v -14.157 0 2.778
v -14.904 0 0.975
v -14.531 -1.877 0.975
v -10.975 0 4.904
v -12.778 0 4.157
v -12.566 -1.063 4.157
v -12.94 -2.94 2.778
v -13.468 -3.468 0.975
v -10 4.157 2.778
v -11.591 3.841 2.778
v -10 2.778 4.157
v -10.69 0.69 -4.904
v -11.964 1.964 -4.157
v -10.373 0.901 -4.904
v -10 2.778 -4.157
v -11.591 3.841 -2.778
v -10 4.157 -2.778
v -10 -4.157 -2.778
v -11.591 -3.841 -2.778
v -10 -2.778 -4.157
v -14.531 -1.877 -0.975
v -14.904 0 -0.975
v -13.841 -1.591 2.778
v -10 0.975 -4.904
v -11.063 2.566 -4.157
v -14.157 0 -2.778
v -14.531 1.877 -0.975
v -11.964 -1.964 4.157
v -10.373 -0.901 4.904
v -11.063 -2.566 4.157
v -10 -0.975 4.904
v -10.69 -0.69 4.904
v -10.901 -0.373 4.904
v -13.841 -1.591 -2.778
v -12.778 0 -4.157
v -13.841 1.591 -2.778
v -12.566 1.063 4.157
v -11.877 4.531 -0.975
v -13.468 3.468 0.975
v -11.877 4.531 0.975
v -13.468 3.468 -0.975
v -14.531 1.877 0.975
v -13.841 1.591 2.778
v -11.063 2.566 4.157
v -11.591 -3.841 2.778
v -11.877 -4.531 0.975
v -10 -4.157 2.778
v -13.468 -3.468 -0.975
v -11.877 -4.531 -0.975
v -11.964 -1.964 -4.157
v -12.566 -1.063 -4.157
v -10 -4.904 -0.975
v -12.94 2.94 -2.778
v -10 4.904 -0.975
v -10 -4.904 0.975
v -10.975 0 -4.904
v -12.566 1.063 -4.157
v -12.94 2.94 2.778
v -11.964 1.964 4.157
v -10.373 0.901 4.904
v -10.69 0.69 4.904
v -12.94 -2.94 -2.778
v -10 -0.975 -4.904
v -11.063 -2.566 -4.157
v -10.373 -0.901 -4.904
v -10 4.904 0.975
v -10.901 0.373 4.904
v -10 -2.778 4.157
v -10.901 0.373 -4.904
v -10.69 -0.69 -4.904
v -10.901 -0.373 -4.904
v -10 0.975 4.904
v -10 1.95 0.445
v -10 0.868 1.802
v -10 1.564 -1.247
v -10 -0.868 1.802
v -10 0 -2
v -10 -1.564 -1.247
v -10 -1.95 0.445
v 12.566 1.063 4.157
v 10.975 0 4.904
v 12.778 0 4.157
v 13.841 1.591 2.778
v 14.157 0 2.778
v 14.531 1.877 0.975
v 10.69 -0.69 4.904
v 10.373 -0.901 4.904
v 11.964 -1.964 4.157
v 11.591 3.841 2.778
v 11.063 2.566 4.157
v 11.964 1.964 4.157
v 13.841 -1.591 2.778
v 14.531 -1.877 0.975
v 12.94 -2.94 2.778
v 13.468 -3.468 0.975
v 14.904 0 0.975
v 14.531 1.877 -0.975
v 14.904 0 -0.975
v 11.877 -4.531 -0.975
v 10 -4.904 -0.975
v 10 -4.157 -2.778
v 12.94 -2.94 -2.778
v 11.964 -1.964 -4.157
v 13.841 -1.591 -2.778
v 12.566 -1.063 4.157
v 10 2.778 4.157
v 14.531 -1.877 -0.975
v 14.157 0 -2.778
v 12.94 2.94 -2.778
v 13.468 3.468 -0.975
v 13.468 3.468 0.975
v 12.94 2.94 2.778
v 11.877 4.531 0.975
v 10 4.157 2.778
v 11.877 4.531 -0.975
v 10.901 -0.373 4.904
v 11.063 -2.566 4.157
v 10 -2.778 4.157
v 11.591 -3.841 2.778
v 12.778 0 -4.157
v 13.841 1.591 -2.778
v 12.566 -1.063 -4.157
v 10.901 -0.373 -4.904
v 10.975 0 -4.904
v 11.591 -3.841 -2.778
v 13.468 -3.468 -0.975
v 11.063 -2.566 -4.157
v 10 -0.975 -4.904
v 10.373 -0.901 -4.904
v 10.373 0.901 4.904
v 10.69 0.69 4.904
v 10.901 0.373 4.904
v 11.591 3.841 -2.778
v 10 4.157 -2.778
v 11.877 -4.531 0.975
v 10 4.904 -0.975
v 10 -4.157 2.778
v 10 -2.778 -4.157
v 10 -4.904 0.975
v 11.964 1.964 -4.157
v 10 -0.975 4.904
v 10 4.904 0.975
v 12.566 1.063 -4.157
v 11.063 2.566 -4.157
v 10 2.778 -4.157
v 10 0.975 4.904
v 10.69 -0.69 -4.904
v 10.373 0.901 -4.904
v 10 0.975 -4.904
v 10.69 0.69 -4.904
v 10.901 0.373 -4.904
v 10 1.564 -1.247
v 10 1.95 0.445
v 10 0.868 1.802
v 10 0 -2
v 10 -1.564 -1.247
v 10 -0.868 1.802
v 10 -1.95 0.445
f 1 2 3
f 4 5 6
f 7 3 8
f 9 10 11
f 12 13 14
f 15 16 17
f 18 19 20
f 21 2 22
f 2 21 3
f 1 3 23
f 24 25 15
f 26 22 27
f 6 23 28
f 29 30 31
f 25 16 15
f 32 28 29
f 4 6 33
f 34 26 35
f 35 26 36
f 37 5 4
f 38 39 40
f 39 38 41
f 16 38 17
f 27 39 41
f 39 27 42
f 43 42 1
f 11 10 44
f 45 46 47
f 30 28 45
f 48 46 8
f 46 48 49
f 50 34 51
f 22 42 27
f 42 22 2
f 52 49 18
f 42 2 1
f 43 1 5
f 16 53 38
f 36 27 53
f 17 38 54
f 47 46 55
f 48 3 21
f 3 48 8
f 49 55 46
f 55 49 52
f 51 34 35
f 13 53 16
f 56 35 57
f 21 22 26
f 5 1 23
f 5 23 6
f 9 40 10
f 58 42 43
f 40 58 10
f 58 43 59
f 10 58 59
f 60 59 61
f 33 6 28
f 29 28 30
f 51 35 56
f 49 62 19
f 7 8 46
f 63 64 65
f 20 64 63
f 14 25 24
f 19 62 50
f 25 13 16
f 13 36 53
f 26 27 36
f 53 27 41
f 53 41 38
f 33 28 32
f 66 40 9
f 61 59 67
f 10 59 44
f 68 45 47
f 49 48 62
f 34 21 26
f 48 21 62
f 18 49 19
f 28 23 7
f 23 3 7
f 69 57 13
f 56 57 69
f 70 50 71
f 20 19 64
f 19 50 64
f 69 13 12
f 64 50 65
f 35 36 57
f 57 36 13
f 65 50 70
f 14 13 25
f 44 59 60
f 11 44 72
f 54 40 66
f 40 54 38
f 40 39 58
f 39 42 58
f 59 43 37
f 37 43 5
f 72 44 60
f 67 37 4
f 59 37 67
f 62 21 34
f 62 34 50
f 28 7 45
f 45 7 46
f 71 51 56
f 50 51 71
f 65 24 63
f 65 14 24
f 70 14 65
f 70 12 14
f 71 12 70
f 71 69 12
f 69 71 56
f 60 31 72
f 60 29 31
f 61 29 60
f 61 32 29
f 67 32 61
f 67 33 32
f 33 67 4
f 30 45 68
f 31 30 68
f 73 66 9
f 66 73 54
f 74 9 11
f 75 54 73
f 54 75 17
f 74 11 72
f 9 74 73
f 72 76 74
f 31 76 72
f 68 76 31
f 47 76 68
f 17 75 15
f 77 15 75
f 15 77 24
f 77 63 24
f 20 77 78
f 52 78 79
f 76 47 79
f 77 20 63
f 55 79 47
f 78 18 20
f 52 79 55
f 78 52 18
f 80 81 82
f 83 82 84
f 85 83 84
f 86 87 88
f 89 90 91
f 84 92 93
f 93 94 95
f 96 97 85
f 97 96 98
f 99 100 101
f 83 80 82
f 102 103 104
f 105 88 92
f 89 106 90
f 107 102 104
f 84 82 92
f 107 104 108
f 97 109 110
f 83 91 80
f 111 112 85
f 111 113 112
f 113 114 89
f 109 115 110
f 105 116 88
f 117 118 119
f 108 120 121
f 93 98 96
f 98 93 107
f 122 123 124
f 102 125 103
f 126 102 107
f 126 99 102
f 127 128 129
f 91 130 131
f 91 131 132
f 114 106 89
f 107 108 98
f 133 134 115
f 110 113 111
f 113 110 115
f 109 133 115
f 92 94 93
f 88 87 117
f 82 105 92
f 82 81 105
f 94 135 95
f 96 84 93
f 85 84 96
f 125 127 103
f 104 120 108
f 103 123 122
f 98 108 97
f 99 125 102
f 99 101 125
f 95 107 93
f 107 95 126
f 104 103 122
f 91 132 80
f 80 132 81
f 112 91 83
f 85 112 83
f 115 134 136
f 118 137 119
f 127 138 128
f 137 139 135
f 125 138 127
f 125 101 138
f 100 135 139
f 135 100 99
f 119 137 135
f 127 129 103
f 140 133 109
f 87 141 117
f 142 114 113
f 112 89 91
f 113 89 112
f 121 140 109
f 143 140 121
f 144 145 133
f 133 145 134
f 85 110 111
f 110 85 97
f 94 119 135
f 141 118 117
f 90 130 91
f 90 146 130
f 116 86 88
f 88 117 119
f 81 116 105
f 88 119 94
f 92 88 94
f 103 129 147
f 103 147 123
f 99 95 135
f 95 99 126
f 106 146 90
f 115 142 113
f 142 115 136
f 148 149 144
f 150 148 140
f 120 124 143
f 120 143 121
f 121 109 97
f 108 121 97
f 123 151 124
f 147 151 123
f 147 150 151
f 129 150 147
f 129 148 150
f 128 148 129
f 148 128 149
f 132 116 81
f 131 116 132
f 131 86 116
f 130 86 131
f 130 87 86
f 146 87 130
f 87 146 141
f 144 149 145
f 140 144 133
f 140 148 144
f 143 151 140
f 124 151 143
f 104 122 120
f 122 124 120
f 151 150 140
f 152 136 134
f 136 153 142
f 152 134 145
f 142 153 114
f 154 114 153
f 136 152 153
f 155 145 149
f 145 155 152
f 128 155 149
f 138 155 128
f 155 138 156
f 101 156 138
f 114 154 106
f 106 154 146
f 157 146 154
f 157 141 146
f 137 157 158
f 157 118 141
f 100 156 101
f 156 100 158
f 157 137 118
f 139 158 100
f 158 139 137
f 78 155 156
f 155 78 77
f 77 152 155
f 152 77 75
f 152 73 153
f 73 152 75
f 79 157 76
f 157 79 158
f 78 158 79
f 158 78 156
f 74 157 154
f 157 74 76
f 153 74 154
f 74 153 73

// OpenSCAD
//mirror([1,0,0])
union(){
	translate([-10,0,0])
		difference() {
			color("red") sphere(r=5);
			translate([0,-5,-5]) cube(10);
		}
		rotate([0,90,0]) cylinder(r=2, h=20, center=true);
		translate([10,0,0])
			difference() {
				color("green") sphere(r=5);
				translate([-10,-5,-5]) cube(10);
			}
}
